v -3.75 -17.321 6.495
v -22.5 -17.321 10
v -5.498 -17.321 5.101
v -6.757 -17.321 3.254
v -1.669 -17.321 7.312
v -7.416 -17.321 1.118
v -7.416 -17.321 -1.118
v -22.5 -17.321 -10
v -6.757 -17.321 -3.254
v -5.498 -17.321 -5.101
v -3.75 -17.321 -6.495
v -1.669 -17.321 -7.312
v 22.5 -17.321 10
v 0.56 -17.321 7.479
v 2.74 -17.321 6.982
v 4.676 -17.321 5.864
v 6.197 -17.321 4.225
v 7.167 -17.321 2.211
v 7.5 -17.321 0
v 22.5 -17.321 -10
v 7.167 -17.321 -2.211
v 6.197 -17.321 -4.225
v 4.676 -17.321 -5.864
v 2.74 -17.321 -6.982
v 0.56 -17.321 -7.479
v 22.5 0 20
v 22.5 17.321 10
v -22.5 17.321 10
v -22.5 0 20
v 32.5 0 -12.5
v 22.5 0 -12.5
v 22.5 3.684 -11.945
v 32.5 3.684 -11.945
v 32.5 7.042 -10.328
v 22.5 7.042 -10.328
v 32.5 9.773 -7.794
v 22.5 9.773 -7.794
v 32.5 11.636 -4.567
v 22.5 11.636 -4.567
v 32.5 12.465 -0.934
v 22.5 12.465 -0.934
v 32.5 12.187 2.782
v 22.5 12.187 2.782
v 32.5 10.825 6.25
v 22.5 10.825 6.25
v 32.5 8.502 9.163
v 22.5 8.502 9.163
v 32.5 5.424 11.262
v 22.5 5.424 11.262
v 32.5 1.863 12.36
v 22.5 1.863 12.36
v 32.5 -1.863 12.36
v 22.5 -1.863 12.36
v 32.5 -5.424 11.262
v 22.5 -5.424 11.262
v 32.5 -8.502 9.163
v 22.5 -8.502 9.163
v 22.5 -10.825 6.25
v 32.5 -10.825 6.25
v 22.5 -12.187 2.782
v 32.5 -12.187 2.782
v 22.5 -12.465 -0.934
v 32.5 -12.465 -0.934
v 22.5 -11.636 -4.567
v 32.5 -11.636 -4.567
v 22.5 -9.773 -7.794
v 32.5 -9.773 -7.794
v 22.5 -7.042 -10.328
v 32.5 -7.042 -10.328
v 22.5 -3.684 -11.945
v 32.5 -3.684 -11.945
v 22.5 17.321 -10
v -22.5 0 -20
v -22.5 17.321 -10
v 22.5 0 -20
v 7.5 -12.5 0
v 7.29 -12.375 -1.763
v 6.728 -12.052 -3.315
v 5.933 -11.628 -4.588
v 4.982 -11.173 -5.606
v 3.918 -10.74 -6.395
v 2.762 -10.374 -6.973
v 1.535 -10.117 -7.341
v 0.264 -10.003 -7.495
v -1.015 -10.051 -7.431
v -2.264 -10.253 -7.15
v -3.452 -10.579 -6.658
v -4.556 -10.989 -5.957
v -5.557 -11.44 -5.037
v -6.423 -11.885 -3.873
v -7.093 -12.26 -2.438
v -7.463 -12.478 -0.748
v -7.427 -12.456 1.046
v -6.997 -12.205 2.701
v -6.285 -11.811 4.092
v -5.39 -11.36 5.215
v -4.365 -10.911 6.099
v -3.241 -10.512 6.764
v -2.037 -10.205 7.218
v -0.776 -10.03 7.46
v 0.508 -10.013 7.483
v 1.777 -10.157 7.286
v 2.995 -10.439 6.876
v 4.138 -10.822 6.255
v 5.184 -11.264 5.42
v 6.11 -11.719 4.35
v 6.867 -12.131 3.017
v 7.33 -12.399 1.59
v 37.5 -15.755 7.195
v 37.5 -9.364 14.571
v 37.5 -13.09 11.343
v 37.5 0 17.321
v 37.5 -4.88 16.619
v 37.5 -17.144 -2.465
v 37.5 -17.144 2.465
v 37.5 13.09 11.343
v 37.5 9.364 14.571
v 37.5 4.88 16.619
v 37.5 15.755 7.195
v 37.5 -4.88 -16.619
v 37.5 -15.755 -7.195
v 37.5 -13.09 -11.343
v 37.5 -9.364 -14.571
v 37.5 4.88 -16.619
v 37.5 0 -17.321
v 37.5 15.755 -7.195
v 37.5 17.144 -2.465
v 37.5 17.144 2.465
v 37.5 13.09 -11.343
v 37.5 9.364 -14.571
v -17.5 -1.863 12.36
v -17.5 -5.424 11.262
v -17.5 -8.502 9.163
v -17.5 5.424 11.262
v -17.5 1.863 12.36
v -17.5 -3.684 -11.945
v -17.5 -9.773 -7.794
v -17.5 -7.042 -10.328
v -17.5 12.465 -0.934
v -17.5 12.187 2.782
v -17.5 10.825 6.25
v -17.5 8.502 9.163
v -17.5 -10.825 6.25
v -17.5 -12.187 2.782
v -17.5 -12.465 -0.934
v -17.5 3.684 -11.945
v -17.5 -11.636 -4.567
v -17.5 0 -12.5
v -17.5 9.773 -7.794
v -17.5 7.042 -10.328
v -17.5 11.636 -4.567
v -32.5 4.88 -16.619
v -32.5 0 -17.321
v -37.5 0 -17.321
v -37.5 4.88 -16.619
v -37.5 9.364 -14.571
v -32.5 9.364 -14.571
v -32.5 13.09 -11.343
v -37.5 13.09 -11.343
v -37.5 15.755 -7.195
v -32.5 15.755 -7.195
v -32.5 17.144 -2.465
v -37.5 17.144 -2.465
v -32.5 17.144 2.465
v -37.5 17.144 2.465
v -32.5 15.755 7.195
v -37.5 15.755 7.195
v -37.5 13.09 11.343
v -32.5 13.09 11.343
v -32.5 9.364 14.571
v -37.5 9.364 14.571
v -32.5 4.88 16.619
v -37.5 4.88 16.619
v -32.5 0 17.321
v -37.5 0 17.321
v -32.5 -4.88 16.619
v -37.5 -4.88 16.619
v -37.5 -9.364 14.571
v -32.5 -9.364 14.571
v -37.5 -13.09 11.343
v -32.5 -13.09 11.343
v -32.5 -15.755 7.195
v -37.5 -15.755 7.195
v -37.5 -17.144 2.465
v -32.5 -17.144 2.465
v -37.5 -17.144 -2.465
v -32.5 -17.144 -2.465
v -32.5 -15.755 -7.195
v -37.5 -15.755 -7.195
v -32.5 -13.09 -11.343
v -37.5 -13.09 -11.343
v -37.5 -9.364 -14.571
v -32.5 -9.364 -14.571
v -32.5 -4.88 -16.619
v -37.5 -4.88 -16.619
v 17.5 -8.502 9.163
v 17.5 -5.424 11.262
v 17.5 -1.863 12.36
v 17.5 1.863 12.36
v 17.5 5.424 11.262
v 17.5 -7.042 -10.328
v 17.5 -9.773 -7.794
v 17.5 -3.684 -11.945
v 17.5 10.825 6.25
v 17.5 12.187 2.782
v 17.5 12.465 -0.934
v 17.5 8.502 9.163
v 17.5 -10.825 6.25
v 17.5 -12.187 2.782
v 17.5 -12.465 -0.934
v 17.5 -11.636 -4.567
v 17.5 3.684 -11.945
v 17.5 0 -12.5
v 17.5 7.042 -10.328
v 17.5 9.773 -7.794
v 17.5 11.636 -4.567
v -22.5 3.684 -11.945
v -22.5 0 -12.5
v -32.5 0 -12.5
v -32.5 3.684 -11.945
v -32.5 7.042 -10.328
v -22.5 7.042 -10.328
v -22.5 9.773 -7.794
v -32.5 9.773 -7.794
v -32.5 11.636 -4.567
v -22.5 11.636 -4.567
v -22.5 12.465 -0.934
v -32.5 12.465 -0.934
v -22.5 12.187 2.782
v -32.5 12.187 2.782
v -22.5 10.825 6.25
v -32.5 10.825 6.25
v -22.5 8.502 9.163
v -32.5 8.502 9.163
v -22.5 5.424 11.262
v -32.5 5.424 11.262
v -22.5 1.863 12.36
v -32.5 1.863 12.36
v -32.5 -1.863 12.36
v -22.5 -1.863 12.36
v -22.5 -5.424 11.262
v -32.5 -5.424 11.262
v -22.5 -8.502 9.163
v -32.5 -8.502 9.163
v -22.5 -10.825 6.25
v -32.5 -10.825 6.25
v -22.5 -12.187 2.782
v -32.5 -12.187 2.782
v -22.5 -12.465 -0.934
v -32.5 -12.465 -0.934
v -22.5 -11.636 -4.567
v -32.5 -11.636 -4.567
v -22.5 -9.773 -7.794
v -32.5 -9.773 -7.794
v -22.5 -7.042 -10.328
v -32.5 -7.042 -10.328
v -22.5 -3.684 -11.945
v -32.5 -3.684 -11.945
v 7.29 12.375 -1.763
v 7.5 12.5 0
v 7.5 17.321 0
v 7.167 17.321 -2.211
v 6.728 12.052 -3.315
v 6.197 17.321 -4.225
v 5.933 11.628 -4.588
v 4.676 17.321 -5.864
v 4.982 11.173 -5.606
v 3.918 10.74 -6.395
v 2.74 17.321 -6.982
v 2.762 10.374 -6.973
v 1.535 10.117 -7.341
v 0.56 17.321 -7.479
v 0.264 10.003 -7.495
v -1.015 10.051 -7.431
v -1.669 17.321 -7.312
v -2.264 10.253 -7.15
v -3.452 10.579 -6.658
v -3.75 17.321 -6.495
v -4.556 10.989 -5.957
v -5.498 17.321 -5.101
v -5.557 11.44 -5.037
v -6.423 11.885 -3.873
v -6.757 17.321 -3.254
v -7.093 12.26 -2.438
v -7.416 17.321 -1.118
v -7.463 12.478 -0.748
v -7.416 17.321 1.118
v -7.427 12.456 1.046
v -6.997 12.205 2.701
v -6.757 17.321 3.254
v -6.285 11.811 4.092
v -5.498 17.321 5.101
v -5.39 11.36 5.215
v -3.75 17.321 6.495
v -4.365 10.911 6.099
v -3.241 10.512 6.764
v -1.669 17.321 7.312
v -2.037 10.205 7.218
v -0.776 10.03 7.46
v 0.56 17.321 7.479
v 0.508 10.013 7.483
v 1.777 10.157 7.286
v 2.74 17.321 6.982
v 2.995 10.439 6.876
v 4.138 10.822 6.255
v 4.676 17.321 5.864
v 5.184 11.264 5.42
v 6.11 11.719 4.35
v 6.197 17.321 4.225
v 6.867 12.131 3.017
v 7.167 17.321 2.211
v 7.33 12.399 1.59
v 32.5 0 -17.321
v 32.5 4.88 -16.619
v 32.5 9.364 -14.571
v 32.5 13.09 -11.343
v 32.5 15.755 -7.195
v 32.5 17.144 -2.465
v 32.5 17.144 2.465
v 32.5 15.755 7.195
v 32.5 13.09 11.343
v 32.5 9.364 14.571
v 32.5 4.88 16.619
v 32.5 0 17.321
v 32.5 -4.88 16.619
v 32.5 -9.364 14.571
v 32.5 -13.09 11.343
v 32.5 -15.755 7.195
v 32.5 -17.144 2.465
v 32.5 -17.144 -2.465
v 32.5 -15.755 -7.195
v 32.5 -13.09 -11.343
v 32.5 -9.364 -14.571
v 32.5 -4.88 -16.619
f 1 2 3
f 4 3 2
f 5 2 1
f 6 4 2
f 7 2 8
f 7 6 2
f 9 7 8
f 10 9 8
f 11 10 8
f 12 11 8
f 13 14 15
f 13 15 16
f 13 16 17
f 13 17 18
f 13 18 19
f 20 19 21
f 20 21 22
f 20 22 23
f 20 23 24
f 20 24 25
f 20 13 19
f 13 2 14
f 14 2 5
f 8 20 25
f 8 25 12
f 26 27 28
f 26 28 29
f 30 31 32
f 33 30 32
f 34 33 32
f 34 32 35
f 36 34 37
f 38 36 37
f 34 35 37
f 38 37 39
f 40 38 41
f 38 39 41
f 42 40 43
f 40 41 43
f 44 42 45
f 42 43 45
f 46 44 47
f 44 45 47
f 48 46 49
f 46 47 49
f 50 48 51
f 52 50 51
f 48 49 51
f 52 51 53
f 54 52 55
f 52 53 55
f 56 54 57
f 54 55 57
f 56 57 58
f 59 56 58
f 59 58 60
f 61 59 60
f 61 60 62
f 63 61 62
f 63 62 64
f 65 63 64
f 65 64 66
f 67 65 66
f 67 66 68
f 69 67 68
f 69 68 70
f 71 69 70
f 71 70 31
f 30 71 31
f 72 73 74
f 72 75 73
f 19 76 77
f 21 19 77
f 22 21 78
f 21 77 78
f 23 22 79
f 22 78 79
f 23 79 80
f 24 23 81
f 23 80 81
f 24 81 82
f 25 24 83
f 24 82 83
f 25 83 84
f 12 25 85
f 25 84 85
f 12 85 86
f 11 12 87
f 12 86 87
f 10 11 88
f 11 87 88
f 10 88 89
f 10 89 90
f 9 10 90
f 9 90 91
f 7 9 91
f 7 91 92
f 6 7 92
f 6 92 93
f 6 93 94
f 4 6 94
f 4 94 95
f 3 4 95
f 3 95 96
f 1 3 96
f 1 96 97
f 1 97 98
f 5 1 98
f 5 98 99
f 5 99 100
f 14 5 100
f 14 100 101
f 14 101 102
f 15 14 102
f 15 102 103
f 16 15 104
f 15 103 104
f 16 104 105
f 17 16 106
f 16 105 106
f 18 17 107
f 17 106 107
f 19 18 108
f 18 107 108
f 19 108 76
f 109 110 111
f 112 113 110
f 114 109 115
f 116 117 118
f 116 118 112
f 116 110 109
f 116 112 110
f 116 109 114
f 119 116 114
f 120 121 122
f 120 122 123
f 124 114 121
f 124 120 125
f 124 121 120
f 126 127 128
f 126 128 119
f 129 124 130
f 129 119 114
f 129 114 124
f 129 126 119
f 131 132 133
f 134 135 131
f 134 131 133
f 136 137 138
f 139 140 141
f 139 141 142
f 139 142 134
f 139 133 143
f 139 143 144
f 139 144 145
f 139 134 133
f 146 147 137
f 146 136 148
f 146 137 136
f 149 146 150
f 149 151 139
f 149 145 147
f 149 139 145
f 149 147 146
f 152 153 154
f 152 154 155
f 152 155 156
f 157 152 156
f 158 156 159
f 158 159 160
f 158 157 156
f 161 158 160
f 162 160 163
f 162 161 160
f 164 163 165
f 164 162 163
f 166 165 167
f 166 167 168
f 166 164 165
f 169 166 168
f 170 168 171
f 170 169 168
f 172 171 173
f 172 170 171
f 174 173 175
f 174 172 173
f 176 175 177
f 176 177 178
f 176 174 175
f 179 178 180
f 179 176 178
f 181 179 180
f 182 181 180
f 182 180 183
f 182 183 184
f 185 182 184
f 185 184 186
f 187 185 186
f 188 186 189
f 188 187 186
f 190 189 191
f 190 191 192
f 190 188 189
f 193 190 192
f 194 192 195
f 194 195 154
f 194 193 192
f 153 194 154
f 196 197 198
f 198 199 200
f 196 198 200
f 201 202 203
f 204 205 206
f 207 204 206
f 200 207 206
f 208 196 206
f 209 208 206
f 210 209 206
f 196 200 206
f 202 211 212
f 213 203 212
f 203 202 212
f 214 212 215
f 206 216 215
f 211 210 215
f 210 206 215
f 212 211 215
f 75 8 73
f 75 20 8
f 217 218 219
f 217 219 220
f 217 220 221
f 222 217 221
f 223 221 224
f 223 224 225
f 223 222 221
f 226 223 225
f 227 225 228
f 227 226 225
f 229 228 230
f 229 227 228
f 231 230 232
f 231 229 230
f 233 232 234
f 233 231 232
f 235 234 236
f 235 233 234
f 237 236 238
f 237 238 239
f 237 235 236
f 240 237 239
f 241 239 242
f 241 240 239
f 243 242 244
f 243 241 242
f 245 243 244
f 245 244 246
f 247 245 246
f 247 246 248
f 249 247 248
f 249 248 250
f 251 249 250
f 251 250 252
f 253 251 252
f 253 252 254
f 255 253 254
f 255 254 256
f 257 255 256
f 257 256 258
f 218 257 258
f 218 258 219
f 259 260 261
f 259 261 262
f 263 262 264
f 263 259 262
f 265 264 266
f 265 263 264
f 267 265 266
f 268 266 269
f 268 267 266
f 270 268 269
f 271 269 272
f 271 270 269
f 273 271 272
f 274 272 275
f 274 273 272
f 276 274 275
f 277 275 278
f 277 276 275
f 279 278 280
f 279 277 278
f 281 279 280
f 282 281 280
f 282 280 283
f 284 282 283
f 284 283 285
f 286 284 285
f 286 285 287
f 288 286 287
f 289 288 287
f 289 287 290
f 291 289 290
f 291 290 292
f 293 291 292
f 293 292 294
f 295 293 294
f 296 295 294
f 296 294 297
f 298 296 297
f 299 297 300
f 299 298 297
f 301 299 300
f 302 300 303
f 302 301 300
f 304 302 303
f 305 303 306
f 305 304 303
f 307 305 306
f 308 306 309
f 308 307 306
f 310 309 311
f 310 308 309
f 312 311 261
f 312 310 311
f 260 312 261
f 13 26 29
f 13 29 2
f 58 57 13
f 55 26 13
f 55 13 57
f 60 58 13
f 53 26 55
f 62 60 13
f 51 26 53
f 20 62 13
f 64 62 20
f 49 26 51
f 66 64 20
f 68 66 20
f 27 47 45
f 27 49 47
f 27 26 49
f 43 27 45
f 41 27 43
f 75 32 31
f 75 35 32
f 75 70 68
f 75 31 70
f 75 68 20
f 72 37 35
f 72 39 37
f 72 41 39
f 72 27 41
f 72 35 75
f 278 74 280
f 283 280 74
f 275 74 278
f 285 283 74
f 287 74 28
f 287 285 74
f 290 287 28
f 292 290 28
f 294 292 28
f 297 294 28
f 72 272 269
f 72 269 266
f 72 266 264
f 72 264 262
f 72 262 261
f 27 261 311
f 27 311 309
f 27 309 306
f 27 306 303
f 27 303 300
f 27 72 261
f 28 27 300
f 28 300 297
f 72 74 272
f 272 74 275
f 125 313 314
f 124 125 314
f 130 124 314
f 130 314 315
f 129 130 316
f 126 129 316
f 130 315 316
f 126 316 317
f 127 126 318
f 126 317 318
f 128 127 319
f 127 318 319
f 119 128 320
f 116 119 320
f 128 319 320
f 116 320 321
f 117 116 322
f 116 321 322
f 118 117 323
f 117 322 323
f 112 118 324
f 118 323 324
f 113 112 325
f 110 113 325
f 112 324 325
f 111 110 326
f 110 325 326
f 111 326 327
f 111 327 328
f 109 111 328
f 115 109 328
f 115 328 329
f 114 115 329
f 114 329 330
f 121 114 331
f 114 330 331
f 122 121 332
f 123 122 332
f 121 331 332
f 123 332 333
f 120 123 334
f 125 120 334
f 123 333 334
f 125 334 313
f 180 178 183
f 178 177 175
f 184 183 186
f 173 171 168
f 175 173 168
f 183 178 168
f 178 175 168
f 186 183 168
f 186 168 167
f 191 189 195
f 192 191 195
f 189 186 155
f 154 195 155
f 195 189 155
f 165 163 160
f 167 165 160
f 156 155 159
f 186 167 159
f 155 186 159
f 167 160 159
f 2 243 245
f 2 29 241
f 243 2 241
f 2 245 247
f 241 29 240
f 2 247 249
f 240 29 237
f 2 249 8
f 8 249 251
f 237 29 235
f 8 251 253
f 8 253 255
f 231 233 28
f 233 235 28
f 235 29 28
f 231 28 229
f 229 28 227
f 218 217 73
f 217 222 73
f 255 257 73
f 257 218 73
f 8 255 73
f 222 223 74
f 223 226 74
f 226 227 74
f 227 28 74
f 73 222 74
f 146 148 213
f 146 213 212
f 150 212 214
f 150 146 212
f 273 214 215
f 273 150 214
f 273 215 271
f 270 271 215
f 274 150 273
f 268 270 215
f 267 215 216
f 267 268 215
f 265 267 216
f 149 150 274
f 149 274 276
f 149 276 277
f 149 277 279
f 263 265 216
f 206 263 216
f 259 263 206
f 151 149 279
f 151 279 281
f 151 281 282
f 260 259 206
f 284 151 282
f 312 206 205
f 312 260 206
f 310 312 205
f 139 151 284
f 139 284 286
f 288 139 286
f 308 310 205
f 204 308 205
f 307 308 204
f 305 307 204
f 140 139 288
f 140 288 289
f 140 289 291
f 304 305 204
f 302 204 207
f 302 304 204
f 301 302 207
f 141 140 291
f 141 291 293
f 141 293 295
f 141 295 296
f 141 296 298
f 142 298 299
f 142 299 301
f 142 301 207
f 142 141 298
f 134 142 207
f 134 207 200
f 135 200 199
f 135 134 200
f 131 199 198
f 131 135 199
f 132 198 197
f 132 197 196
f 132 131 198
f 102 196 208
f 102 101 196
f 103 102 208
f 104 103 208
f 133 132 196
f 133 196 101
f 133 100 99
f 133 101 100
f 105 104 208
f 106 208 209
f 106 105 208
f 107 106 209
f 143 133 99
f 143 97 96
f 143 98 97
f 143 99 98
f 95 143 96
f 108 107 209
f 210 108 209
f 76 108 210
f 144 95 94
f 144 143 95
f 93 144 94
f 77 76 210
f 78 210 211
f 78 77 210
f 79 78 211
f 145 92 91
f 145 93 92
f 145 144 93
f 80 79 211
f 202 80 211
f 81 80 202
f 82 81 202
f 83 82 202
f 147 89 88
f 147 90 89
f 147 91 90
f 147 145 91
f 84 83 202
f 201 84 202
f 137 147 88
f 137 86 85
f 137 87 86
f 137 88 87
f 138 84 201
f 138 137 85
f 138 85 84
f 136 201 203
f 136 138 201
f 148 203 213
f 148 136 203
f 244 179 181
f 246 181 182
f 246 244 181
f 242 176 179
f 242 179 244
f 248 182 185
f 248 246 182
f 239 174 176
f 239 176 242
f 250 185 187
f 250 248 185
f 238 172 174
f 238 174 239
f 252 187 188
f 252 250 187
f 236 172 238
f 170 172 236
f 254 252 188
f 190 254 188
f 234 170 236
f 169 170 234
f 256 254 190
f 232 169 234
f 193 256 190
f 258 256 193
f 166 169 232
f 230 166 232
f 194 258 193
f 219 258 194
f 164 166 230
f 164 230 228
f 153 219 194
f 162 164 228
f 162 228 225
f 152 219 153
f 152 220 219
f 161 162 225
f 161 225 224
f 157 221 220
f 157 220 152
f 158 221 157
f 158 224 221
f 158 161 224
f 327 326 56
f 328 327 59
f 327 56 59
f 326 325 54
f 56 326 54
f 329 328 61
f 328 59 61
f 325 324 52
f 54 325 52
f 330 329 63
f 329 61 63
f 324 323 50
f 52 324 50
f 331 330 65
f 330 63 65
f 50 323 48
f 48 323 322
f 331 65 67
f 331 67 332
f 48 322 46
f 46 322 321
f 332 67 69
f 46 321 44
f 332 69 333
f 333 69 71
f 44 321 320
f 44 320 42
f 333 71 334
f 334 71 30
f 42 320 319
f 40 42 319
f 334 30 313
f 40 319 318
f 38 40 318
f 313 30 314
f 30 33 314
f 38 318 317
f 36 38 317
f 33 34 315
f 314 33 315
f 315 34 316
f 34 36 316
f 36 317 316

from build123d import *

# Parameters (mm, degrees)
SKETCH1_R               = 12.5
BOSS_EXTRUDE1_DEPTH     = 22.5
SKETCH2_R               = 7.5
CUT_EXTRUDE2_DEPTH      = 18.320508076
CUT_EXTRUDE2_DEPTH_BACK = 18.320508076
BOSS_EXTRUDE2_START     = -5
SKETCH3_R               = 12.5
BOSS_EXTRUDE2_DEPTH     = 15
SKETCH4_R               = 17.320508076
BOSS_EXTRUDE3_DEPTH     = 5


with BuildPart() as part:
    # Sketch1 → Boss-Extrude1 (new body, symmetric)
    with BuildSketch(Plane(origin=(0, 0, 0), x_dir=(0, 0, -1), z_dir=(1, 0, 0))):
        Polygon((10, 17.320508076), (-10, 17.320508076), (-20, 0), (-10, -17.320508076), (10, -17.320508076), (20, 0), align=None)
        Circle(SKETCH1_R, mode=Mode.SUBTRACT)
    extrude(amount=BOSS_EXTRUDE1_DEPTH, both=True)

    # Sketch2 → Cut-Extrude2 (cut, two sides)
    with BuildSketch(Plane(origin=(0, 0, 0), x_dir=(1, 0, 0), z_dir=(0, 1, 0))) as cut_extrude2_sk:
        Circle(SKETCH2_R)
    extrude(amount=CUT_EXTRUDE2_DEPTH, mode=Mode.SUBTRACT)
    extrude(cut_extrude2_sk.sketch, amount=-CUT_EXTRUDE2_DEPTH_BACK, mode=Mode.SUBTRACT)

    # Sketch3 → Boss-Extrude2 (add)
    with BuildSketch(Plane(origin=(22.5, 0, 0), x_dir=(0, 0, -1), z_dir=(1, 0, 0)).offset(BOSS_EXTRUDE2_START)):
        Circle(SKETCH3_R)
    boss_extrude2 = extrude(amount=BOSS_EXTRUDE2_DEPTH)

    # Sketch4 → Boss-Extrude3 (add)
    with BuildSketch(Plane(origin=(32.5, 0, 0), x_dir=(0, 0, -1), z_dir=(1, 0, 0))):
        Circle(SKETCH4_R)
    boss_extrude3 = extrude(amount=BOSS_EXTRUDE3_DEPTH)

    # Mirror3: Boss-Extrude2, Boss-Extrude3 across plane
    add(boss_extrude2.mirror(Plane(origin=(0, 0, 0), x_dir=(0, 0, 1), z_dir=(1, 0, 0))))
    add(boss_extrude3.mirror(Plane(origin=(0, 0, 0), x_dir=(0, 0, 1), z_dir=(1, 0, 0))))


solid = part.part
